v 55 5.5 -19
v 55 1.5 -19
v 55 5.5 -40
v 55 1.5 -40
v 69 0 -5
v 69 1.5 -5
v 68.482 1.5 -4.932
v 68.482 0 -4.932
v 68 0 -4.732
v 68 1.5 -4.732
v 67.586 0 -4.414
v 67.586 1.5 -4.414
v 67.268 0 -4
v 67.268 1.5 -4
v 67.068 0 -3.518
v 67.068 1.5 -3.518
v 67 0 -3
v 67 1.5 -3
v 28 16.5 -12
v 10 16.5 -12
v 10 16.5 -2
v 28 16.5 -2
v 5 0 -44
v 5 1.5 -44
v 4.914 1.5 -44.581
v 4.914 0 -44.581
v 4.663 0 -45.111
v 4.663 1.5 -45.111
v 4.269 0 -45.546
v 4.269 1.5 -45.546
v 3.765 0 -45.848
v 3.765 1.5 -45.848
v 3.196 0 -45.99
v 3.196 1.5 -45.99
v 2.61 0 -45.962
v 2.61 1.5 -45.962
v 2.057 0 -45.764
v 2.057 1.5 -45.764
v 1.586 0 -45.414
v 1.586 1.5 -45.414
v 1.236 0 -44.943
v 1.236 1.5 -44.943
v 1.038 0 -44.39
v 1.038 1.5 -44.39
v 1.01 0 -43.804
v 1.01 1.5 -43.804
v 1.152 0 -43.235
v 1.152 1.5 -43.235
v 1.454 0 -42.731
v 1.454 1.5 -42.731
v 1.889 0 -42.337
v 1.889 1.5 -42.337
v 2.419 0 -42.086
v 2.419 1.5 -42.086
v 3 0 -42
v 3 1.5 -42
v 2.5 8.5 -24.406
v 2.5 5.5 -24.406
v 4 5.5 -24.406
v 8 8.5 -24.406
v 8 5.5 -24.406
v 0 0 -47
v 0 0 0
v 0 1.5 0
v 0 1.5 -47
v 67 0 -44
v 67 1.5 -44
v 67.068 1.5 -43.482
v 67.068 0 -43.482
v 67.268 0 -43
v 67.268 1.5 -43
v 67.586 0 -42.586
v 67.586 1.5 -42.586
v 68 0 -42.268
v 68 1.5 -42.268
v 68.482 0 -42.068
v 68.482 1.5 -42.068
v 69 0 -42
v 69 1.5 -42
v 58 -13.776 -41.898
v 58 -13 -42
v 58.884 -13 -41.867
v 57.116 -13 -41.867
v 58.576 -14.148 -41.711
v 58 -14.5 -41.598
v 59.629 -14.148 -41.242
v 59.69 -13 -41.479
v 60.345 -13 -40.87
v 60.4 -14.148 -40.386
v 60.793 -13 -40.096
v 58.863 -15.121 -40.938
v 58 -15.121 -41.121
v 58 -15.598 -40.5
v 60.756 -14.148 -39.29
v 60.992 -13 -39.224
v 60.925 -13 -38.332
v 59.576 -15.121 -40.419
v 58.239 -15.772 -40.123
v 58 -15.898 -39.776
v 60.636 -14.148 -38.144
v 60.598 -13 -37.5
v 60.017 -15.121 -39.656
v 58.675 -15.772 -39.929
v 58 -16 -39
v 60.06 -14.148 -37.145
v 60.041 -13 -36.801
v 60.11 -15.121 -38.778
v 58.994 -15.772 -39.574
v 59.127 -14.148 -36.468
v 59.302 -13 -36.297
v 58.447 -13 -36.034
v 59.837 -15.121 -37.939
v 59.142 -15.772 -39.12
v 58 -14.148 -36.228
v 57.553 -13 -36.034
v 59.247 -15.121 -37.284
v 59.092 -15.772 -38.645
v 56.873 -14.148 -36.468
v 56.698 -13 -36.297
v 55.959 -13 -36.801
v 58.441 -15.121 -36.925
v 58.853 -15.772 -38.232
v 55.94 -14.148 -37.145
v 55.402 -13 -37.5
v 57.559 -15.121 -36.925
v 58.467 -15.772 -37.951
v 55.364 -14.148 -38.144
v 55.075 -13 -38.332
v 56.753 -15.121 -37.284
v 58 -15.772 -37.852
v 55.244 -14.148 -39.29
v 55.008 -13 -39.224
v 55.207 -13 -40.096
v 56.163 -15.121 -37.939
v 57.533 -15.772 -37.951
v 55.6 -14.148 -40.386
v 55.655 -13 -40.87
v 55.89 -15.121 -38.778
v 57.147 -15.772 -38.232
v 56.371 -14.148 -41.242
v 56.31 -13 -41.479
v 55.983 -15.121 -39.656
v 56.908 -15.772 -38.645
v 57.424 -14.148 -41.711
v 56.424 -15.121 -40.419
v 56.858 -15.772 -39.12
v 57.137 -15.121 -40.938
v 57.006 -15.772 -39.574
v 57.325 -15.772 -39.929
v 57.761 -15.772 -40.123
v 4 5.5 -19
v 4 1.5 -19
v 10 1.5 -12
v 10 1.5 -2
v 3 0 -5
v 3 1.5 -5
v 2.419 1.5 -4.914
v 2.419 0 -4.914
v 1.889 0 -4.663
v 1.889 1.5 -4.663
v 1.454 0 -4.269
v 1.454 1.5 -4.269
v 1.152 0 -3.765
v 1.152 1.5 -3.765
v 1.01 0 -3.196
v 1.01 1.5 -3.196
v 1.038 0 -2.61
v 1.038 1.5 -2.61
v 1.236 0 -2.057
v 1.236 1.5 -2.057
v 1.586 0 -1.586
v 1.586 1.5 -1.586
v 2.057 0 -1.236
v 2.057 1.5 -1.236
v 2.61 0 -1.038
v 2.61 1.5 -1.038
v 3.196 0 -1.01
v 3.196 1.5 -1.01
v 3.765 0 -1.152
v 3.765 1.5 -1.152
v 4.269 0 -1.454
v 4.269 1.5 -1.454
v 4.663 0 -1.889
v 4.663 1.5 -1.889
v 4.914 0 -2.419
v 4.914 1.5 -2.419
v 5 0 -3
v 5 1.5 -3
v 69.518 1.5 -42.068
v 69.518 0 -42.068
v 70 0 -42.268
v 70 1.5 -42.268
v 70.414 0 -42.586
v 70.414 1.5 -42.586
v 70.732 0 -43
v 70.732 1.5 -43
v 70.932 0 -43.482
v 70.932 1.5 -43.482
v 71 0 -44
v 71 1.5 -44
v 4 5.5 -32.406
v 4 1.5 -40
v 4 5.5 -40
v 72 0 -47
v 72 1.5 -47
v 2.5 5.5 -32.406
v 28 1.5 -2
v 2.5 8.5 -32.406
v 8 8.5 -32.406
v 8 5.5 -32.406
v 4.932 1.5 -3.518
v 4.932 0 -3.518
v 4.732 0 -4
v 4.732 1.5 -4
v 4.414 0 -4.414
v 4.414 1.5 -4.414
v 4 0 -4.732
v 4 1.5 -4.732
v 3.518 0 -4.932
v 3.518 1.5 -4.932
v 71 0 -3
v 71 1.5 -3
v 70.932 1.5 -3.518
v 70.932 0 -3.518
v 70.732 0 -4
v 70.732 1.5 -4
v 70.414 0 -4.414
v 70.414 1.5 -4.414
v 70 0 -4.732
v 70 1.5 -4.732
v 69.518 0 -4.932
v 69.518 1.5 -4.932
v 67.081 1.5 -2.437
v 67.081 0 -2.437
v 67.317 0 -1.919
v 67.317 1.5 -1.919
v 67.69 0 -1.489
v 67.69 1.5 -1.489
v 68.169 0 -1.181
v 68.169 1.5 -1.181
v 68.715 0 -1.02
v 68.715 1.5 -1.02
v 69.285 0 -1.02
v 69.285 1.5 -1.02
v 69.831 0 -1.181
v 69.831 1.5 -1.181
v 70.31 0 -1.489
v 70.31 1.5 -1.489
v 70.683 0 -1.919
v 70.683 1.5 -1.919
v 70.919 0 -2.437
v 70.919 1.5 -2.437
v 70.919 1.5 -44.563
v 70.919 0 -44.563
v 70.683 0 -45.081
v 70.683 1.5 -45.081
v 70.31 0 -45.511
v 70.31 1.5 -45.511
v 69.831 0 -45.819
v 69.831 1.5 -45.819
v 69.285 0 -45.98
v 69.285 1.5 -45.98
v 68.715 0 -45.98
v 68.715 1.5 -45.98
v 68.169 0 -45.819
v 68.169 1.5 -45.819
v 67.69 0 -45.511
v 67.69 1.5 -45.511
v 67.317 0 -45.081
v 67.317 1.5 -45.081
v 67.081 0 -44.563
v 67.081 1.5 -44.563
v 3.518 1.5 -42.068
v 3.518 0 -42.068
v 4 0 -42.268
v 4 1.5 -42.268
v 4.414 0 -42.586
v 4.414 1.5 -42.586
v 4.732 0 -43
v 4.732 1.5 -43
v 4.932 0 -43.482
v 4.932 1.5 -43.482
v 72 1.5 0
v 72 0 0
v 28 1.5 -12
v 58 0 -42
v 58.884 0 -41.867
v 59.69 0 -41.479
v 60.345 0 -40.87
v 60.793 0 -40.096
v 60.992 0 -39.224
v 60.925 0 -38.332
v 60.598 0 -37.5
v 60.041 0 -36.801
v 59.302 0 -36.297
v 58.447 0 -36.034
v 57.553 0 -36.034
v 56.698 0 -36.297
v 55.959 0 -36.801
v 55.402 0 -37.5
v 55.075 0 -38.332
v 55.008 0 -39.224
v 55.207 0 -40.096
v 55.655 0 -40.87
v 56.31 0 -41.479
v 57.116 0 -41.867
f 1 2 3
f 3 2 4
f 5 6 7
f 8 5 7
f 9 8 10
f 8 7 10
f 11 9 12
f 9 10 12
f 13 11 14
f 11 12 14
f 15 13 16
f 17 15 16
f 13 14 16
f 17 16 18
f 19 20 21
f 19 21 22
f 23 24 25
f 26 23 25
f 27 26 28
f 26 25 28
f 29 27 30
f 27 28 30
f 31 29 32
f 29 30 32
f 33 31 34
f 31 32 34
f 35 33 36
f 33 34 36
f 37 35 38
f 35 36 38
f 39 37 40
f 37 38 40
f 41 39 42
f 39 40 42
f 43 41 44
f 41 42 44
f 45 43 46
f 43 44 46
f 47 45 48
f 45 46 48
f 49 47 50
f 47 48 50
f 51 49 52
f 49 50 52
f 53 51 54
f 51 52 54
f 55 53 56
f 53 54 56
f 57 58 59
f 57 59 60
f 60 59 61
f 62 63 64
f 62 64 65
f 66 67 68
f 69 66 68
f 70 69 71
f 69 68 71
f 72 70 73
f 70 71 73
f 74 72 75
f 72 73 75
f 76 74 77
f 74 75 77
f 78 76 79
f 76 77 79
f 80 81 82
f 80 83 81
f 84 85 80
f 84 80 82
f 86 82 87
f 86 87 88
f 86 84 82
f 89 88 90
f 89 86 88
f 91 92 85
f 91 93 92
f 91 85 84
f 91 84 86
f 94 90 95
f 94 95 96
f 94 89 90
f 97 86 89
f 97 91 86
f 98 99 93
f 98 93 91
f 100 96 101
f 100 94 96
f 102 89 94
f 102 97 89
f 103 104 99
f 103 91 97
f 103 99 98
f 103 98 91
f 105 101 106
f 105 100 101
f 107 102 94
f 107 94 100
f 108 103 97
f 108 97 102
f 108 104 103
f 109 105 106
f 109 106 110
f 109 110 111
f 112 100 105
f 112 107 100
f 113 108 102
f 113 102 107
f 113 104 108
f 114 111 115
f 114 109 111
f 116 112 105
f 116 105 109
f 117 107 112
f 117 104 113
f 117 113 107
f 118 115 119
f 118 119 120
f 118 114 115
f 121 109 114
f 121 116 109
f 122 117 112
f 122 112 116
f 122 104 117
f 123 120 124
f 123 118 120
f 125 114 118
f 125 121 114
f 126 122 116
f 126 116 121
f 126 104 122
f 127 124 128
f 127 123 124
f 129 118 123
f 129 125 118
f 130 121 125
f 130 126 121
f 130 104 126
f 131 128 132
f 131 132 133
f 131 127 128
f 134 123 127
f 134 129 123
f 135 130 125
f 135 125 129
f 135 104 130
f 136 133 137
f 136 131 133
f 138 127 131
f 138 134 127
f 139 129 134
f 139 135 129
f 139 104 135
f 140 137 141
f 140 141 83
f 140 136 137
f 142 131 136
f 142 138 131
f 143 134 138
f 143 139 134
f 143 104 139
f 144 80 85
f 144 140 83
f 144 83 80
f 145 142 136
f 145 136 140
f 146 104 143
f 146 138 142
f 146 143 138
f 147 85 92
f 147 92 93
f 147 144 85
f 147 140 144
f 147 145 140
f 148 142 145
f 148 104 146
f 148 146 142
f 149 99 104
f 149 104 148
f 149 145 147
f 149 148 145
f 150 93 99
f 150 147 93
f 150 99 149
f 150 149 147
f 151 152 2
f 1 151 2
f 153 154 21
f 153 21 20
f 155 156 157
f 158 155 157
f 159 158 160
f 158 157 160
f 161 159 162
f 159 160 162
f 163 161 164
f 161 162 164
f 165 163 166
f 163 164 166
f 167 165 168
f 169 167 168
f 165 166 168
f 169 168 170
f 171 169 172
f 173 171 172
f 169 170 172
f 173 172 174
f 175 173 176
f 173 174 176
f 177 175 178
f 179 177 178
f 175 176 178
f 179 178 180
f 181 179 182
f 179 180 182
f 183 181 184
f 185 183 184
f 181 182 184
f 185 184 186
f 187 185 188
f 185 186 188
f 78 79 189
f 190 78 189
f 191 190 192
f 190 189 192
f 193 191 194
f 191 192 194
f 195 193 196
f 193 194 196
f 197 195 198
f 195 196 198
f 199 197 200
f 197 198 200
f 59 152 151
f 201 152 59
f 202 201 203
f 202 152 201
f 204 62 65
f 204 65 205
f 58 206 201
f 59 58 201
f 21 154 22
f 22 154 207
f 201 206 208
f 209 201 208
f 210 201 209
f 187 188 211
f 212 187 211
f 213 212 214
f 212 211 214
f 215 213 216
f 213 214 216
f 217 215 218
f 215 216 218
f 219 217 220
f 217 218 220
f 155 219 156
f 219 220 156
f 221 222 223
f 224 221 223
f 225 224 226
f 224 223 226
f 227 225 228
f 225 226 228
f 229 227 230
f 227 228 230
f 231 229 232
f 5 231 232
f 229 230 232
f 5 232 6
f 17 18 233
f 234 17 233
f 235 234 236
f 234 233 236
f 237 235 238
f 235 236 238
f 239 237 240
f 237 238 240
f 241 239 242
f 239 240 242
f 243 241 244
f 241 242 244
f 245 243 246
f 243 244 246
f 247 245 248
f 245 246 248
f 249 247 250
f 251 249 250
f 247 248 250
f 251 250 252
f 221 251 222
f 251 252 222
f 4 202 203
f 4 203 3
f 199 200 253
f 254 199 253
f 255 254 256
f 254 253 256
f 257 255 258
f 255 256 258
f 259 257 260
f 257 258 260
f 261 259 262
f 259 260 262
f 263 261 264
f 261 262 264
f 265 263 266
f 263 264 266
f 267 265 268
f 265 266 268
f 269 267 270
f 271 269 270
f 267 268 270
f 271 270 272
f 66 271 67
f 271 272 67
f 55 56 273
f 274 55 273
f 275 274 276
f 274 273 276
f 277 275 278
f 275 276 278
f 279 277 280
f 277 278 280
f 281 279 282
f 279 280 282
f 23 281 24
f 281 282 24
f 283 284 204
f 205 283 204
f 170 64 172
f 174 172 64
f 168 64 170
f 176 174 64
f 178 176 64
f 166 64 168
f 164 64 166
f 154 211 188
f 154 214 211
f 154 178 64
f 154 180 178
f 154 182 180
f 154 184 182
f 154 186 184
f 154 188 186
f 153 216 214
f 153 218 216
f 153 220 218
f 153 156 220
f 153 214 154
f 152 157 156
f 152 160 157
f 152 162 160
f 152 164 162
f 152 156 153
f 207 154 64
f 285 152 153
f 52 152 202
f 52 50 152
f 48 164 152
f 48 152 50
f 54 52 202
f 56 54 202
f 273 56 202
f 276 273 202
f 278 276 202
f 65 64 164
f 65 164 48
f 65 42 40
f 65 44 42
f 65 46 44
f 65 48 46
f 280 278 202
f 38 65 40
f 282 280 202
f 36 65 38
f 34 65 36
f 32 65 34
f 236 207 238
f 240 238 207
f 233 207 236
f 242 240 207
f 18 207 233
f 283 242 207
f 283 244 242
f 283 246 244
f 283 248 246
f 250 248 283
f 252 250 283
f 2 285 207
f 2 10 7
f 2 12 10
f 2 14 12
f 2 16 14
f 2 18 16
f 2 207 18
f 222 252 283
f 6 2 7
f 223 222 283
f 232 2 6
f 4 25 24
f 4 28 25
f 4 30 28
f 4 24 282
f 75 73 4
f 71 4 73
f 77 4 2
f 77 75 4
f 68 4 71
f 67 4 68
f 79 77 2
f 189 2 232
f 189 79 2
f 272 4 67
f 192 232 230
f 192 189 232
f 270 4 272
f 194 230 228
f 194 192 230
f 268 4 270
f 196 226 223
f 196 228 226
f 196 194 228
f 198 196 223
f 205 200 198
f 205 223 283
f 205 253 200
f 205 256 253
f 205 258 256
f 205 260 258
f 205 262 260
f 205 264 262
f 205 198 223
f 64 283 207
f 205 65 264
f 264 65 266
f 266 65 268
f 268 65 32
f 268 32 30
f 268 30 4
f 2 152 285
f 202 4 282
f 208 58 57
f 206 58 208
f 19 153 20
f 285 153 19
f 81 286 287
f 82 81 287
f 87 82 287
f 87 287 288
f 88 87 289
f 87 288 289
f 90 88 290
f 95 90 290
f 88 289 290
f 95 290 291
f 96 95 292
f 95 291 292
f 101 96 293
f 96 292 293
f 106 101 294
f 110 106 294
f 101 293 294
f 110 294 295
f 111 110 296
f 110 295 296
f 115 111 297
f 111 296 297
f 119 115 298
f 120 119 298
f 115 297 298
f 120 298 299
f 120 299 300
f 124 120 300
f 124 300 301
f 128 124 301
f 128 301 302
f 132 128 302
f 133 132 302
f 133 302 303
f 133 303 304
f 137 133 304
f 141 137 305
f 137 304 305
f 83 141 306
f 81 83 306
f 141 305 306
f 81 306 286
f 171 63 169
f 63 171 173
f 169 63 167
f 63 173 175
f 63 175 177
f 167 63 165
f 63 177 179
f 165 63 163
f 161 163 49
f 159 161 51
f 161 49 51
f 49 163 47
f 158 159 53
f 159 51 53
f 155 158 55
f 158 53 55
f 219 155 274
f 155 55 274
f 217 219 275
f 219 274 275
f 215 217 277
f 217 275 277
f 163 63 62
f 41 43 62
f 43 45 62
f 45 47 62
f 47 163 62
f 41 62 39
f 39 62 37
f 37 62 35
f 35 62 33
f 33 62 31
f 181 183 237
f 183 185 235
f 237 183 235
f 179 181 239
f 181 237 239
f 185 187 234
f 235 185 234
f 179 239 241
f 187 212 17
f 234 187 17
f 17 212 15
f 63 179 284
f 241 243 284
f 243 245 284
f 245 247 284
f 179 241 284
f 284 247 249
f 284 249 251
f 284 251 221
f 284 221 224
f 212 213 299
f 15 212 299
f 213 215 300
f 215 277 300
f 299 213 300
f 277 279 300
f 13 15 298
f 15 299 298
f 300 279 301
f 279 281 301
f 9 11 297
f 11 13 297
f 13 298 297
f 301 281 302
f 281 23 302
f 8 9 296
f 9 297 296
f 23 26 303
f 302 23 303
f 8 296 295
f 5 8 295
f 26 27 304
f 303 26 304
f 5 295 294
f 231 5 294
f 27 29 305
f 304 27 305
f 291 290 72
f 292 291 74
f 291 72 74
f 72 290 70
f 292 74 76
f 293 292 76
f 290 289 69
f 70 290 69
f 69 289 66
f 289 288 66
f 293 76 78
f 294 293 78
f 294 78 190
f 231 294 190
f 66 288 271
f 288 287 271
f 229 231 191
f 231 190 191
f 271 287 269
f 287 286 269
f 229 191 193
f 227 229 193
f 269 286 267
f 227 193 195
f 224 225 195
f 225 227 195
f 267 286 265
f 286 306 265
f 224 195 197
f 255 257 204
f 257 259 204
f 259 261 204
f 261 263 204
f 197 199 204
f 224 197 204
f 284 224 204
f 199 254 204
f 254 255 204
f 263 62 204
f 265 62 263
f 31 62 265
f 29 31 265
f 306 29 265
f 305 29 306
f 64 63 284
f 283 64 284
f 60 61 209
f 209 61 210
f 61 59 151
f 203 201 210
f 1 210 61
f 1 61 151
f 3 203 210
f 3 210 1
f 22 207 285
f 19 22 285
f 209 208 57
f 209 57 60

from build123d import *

# Parameters (mm, degrees)
SKETCH1_W           = 72
SKETCH1_H           = 47
BOSS_EXTRUDE1_DEPTH = 1.5
CUT_EXTRUDE1_DEPTH  = 1.5
SKETCH3_W           = 18
SKETCH3_H           = 10
BOSS_EXTRUDE2_DEPTH = 15
SKETCH4_W           = 51
SKETCH4_H           = 21
BOSS_EXTRUDE3_DEPTH = 4
SKETCH5_W           = 5.5
SKETCH5_H           = 8
BOSS_EXTRUDE4_DEPTH = 3
SKETCH6_R           = 3
BOSS_EXTRUDE5_DEPTH = 16
FILLET1_R           = 3


with BuildPart() as part:
    # Sketch1 → Boss-Extrude1 (new body)
    with BuildSketch(Plane(origin=(0, 0, 0), x_dir=(1, 0, 0), z_dir=(0, 1, 0))):
        with Locations((36, 23.5)):
            Rectangle(SKETCH1_W, SKETCH1_H)
    extrude(amount=BOSS_EXTRUDE1_DEPTH)

    # Sketch2 → Cut-Extrude1 (cut)
    with BuildSketch(Plane(origin=(0, 1.5, 0), x_dir=(1, 0, 0), z_dir=(0, 1, 0))):
        with BuildLine():
            ThreePointArc((67, 44), (67.585786438, 42.585786438), (69, 42))
            Line((69, 42), (69, 44))
            Line((69, 44), (67, 44))
        make_face()
        with BuildLine():
            Line((69, 44), (69, 42))
            ThreePointArc((69, 42), (70.414213562, 42.585786438), (71, 44))
            ThreePointArc((71, 44), (69, 46), (67, 44))
            Line((67, 44), (69, 44))
        make_face()
        with BuildLine():
            ThreePointArc((69, 5), (67.585786438, 4.414213562), (67, 3))
            Line((67, 3), (69, 3))
            Line((69, 3), (69, 5))
        make_face()
        with BuildLine():
            Line((69, 3), (67, 3))
            ThreePointArc((67, 3), (69, 1), (71, 3))
            ThreePointArc((71, 3), (70.414213562, 4.414213562), (69, 5))
            Line((69, 5), (69, 3))
        make_face()
        with BuildLine():
            Line((3, 5), (3, 3))
            Line((3, 3), (5, 3))
            ThreePointArc((5, 3), (4.414213562, 4.414213562), (3, 5))
        make_face()
        with BuildLine():
            Line((5, 3), (3, 3))
            Line((3, 3), (3, 5))
            ThreePointArc((3, 5), (1.585786438, 1.585786438), (5, 3))
        make_face()
        with BuildLine():
            ThreePointArc((5, 44), (1.585786438, 45.414213562), (3, 42))
            Line((3, 42), (3, 44))
            Line((3, 44), (5, 44))
        make_face()
        with BuildLine():
            Line((3, 44), (3, 42))
            ThreePointArc((3, 42), (4.414213562, 42.585786438), (5, 44))
            Line((5, 44), (3, 44))
        make_face()
    extrude(amount=-CUT_EXTRUDE1_DEPTH, mode=Mode.SUBTRACT)

    # Sketch3 → Boss-Extrude2 (add)
    with BuildSketch(Plane(origin=(0, 1.5, 0), x_dir=(1, 0, 0), z_dir=(0, 1, 0))):
        with Locations((19, 7)):
            Rectangle(SKETCH3_W, SKETCH3_H)
    extrude(amount=BOSS_EXTRUDE2_DEPTH)

    # Sketch4 → Boss-Extrude3 (add)
    with BuildSketch(Plane(origin=(0, 1.5, 0), x_dir=(1, 0, 0), z_dir=(0, 1, 0))):
        with Locations((29.5, 29.5)):
            Rectangle(SKETCH4_W, SKETCH4_H)
    extrude(amount=BOSS_EXTRUDE3_DEPTH)

    # Sketch5 → Boss-Extrude4 (add)
    with BuildSketch(Plane(origin=(0, 5.5, 0), x_dir=(1, 0, 0), z_dir=(0, 1, 0))):
        with Locations((5.25, 28.406225208)):
            Rectangle(SKETCH5_W, SKETCH5_H)
    extrude(amount=BOSS_EXTRUDE4_DEPTH)

    # Sketch6 → Boss-Extrude5 (add)
    with BuildSketch(Plane.XZ):
        with Locations(Location((58, -39, 0), (0, 0, 270))):
            Circle(SKETCH6_R)
    extrude(amount=BOSS_EXTRUDE5_DEPTH)

    # Fillet1
    fillet1_edges = [part.edges().sort_by_distance(p)[0] for p in [
        (58, -16, -36),
    ]]
    fillet(fillet1_edges, radius=FILLET1_R)


solid = part.part
